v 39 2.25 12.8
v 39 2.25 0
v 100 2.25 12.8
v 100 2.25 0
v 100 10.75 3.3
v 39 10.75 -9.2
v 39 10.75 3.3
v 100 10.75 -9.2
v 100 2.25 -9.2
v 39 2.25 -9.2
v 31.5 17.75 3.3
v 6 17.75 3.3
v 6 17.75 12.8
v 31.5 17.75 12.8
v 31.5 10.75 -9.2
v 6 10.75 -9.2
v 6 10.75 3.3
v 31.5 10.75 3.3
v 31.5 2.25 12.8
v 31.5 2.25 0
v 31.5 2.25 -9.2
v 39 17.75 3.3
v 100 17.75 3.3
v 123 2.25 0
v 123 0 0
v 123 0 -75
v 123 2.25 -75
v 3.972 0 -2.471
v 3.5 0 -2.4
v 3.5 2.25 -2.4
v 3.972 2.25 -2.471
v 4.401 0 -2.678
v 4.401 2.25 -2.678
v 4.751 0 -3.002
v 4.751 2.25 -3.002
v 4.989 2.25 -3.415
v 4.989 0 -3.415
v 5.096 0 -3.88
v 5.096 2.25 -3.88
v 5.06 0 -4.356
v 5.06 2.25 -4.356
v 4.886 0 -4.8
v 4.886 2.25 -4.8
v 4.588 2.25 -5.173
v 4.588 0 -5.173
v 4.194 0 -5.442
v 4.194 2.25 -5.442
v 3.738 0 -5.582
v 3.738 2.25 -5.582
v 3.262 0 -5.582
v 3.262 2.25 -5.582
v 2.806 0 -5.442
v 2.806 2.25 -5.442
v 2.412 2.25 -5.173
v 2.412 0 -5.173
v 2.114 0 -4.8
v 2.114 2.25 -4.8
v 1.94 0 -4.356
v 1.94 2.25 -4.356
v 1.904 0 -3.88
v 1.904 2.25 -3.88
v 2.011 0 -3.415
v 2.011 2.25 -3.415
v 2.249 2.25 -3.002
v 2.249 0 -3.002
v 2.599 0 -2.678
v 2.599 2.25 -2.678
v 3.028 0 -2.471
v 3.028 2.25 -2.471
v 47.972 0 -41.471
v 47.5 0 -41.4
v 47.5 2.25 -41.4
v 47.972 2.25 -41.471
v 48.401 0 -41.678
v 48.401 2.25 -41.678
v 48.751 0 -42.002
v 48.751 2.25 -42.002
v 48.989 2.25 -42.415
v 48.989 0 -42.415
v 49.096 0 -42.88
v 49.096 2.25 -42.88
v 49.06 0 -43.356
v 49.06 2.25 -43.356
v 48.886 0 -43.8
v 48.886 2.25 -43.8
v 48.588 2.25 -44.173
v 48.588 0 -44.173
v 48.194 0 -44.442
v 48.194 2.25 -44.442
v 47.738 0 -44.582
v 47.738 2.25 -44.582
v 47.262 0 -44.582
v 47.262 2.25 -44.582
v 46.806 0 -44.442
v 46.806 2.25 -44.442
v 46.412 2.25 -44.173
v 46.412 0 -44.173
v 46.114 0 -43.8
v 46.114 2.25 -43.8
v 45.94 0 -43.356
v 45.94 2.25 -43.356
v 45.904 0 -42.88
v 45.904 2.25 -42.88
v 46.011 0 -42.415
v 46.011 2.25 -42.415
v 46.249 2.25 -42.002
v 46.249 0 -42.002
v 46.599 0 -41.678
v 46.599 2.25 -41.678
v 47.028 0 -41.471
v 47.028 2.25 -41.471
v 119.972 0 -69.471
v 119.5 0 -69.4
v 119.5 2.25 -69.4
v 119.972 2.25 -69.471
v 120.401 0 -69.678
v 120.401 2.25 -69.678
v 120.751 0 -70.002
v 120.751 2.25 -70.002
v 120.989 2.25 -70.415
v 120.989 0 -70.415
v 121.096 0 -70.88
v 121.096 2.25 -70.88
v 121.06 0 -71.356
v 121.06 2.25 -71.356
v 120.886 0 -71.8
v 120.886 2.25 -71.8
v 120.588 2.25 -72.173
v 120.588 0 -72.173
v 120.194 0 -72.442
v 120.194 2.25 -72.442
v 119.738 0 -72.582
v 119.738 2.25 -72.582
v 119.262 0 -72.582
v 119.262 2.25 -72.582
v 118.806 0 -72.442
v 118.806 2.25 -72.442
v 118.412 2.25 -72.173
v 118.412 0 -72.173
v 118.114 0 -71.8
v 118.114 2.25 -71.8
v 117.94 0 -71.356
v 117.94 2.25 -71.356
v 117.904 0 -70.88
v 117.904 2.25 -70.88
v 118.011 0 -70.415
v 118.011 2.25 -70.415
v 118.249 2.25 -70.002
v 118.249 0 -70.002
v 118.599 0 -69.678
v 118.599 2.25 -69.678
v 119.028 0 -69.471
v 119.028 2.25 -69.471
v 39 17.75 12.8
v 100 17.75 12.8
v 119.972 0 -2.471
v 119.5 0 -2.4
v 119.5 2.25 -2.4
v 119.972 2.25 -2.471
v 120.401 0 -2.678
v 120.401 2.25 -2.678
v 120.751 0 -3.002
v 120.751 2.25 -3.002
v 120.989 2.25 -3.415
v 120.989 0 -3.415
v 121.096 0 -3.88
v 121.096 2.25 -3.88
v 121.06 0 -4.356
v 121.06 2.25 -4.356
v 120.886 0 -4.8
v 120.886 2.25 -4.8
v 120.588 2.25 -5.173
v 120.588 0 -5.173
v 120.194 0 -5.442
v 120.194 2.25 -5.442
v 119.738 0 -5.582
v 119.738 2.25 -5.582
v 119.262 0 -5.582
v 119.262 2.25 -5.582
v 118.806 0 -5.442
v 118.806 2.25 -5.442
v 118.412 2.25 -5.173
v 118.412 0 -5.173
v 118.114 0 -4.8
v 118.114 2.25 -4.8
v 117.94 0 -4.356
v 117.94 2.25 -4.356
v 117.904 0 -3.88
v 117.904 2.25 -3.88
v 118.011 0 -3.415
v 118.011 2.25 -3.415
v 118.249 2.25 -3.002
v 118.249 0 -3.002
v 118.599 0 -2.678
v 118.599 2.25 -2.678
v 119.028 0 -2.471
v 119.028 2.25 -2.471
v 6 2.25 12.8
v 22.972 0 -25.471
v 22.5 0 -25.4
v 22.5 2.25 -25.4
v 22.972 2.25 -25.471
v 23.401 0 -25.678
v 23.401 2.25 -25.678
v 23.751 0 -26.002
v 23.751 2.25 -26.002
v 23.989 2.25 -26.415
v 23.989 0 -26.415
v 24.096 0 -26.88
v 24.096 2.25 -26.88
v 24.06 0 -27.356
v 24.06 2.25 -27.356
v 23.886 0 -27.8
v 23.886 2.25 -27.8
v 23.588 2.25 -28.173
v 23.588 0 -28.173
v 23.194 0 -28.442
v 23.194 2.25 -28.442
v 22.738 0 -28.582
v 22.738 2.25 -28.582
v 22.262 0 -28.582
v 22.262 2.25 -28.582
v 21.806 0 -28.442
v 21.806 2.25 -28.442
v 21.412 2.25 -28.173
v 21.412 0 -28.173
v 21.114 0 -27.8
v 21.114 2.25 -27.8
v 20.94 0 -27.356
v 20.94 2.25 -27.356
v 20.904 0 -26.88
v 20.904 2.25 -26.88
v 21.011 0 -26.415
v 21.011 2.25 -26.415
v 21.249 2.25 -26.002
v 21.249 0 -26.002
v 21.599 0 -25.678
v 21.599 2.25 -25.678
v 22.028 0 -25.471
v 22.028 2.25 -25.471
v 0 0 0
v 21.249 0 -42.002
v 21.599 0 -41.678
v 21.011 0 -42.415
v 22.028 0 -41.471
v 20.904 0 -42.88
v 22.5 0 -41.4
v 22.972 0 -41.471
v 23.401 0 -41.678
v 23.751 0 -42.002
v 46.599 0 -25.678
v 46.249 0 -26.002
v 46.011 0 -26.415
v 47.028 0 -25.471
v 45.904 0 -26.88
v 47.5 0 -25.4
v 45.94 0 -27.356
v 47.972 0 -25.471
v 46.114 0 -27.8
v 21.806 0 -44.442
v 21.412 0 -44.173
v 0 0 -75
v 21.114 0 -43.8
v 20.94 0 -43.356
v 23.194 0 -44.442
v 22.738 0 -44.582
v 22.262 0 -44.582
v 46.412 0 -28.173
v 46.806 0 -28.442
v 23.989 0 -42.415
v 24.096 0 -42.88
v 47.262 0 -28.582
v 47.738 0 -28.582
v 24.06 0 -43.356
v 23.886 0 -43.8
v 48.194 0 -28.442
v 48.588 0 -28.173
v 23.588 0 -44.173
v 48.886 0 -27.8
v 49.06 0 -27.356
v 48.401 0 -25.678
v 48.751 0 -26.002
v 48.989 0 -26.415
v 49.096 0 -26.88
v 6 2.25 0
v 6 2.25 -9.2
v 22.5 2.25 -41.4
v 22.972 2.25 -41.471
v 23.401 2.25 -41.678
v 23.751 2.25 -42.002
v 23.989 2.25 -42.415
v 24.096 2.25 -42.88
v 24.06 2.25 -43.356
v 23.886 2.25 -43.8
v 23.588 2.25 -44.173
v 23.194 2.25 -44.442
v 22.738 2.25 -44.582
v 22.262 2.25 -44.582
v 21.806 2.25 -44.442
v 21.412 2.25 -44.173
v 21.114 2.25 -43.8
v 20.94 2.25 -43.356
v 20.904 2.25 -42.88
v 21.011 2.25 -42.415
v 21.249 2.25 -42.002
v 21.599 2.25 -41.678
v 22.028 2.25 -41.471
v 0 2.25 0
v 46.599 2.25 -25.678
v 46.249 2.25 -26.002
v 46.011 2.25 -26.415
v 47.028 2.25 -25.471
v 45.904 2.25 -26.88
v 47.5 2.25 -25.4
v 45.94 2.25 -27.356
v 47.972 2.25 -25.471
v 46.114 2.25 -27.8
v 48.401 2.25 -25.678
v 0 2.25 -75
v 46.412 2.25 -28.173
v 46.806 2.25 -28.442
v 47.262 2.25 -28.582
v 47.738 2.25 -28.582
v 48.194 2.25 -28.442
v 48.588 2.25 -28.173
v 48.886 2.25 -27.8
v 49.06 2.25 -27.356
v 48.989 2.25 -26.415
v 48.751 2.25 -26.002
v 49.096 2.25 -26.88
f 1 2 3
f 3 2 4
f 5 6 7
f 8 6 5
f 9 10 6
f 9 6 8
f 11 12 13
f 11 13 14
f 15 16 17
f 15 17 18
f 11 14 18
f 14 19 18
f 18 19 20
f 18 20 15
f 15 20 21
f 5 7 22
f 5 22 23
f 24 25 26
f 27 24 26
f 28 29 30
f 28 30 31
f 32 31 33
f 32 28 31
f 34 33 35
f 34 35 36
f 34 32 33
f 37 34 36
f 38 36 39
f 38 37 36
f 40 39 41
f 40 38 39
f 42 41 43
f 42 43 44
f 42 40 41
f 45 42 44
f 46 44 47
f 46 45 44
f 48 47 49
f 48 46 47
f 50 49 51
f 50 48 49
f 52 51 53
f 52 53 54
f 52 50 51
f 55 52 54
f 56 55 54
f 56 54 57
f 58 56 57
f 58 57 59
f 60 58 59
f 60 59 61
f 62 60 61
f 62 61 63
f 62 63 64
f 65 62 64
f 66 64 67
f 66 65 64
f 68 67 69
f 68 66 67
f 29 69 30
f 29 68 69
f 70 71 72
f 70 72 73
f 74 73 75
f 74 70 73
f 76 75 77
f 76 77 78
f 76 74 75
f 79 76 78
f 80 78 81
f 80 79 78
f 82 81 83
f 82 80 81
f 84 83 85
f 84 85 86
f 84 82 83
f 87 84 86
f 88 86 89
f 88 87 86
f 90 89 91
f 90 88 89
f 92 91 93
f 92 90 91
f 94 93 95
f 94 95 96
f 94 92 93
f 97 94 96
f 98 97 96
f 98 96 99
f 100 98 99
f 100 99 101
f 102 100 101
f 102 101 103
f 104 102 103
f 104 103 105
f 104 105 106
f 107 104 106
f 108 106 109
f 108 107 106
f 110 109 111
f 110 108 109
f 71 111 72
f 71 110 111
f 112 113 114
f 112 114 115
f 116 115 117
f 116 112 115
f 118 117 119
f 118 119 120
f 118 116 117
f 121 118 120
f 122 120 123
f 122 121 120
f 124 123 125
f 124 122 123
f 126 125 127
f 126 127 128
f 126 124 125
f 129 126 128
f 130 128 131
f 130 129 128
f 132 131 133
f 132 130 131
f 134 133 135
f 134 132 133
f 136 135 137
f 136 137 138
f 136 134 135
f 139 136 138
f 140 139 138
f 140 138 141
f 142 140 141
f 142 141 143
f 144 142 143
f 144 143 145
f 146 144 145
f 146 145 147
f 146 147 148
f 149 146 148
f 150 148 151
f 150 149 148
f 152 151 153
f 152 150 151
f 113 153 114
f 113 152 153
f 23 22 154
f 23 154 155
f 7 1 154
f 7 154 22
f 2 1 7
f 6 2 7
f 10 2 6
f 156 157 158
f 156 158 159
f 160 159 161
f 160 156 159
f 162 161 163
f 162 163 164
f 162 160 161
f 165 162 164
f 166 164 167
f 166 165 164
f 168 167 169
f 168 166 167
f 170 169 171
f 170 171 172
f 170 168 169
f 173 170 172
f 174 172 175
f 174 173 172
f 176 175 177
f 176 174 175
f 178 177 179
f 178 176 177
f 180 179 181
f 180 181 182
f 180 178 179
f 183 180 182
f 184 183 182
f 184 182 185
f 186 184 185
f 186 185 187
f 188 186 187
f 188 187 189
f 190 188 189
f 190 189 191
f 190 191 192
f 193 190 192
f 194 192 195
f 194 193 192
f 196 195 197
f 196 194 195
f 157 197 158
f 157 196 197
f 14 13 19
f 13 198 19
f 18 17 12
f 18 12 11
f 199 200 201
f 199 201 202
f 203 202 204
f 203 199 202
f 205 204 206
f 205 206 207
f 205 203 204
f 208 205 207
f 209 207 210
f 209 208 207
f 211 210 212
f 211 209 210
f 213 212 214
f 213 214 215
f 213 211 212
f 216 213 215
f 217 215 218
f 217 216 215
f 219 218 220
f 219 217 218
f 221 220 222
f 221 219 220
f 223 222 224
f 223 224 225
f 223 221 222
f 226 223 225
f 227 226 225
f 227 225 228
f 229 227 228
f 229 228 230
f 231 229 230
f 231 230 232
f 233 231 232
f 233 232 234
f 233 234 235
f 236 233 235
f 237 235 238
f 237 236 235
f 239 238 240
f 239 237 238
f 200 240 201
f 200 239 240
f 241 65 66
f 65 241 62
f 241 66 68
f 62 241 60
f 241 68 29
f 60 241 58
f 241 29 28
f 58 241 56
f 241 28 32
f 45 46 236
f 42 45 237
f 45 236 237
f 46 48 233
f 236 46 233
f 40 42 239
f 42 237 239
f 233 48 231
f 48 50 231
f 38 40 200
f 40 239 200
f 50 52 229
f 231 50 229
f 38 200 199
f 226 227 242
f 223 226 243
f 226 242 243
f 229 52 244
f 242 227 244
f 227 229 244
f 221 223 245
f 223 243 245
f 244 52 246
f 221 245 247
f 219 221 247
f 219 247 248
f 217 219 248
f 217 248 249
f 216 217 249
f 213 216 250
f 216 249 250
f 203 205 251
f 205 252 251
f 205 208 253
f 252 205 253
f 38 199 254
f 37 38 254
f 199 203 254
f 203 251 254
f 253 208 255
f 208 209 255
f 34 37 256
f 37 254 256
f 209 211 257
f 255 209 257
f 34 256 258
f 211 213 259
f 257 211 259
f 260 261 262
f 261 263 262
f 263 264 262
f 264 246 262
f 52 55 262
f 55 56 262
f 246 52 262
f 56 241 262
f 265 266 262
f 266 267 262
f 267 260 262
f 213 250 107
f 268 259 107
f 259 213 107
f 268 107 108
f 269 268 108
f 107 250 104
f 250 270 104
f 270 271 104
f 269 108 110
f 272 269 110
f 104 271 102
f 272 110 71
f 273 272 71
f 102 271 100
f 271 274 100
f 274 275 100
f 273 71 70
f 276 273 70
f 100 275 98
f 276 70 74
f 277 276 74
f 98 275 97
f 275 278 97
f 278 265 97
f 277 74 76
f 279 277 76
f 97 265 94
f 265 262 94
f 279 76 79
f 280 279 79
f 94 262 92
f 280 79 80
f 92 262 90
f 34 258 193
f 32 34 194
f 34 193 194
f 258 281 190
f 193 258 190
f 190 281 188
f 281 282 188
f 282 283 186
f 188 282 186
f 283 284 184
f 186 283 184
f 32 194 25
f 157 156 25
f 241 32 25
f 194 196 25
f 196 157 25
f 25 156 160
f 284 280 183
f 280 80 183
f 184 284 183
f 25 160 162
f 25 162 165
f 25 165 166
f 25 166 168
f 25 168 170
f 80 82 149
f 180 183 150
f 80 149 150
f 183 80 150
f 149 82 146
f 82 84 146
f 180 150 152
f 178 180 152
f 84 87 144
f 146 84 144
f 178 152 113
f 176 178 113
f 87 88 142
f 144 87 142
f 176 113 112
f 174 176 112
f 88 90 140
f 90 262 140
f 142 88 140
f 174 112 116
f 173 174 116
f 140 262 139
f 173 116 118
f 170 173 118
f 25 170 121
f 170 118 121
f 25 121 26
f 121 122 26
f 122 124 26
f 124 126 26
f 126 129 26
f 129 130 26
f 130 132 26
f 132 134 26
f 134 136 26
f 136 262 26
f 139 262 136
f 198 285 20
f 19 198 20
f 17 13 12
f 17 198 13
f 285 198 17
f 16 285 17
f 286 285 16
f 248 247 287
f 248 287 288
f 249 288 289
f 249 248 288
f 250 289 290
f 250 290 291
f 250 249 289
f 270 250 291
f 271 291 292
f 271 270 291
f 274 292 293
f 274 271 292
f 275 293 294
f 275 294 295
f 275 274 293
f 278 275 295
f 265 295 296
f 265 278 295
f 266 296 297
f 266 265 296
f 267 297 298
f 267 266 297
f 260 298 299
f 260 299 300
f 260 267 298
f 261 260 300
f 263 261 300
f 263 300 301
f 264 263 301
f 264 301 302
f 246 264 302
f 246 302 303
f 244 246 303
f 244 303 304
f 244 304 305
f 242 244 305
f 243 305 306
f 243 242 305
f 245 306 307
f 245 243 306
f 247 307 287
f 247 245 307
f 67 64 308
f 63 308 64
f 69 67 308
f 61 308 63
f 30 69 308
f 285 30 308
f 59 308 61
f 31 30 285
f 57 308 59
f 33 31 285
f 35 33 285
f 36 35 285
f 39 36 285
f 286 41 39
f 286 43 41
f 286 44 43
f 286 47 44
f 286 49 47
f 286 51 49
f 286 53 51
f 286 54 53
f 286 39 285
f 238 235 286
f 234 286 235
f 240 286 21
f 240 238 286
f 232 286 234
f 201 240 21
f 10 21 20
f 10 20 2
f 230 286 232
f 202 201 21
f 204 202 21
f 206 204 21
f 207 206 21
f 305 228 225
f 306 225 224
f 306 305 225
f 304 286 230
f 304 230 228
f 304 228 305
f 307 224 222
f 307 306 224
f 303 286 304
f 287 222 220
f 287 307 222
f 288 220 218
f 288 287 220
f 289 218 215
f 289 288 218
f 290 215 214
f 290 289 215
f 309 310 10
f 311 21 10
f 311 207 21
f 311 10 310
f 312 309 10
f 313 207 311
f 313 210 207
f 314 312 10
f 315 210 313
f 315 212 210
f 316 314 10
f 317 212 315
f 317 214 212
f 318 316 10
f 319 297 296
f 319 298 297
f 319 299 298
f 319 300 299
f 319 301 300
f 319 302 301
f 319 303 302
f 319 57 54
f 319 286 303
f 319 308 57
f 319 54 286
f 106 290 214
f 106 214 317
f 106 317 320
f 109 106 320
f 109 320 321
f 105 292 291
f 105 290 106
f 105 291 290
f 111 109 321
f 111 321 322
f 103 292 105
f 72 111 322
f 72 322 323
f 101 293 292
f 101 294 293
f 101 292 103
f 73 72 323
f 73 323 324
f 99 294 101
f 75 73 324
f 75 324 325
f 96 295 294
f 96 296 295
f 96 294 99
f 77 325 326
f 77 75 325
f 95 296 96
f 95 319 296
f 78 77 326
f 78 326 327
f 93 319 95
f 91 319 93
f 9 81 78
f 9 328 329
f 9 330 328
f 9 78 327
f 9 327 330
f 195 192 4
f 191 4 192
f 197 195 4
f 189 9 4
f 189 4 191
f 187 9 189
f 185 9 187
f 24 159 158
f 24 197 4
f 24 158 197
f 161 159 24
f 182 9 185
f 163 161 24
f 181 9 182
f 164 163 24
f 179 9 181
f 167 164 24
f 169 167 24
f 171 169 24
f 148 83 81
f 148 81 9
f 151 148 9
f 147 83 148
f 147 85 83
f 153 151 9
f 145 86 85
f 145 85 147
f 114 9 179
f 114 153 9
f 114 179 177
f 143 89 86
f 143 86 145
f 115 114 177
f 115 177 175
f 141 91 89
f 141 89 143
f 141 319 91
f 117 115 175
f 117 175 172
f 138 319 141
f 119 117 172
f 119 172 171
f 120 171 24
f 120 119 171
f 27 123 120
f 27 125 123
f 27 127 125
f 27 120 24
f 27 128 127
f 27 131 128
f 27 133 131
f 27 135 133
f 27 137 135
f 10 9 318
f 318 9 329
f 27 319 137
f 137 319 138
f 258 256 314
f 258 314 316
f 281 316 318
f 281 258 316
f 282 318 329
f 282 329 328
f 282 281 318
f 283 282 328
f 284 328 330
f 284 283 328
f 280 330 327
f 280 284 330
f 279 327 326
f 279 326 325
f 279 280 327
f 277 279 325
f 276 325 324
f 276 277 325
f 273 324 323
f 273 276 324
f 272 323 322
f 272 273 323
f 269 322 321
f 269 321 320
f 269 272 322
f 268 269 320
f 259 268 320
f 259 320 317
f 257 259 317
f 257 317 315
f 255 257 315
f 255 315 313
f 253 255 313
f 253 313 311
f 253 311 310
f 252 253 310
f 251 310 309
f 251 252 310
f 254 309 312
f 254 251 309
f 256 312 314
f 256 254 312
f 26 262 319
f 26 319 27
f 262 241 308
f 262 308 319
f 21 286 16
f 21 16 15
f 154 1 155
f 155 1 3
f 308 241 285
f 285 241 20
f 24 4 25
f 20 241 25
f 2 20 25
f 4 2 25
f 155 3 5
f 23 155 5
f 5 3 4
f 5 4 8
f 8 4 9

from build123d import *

# Parameters (mm, degrees)
SKETCH1_W           = 123
SKETCH1_H           = 75
SKETCH1_R           = 1.6
BOSS_EXTRUDE1_DEPTH = 2.25
SKETCH2_W           = 25.5
SKETCH2_H           = 22
SKETCH2_W_2         = 61
BOSS_EXTRUDE2_DEPTH = 8.5
SKETCH3_W           = 25.5
SKETCH3_H           = 9.5
SKETCH3_W_2         = 61
BOSS_EXTRUDE3_DEPTH = 7


with BuildPart() as part:
    # Sketch1 → Boss-Extrude1 (new body)
    with BuildSketch(Plane(origin=(0, 0, 0), x_dir=(1, 0, 0), z_dir=(0, 1, 0))):
        with Locations((61.5, 37.5)):
            Rectangle(SKETCH1_W, SKETCH1_H)
        with Locations(Location((119.5, 71, 0), (0, 0, 270))):
            Circle(SKETCH1_R, mode=Mode.SUBTRACT)
        with Locations(Location((119.5, 4, 0), (0, 0, 270))):
            Circle(SKETCH1_R, mode=Mode.SUBTRACT)
        with Locations(Location((3.5, 4, 0), (0, 0, 270))):
            Circle(SKETCH1_R, mode=Mode.SUBTRACT)
        with Locations(Location((22.5, 43, 0), (0, 0, 270))):
            Circle(SKETCH1_R, mode=Mode.SUBTRACT)
        with Locations(Location((47.5, 43, 0), (0, 0, 270))):
            Circle(SKETCH1_R, mode=Mode.SUBTRACT)
        with Locations(Location((22.5, 27, 0), (0, 0, 270))):
            Circle(SKETCH1_R, mode=Mode.SUBTRACT)
        with Locations(Location((47.5, 27, 0), (0, 0, 270))):
            Circle(SKETCH1_R, mode=Mode.SUBTRACT)
    extrude(amount=BOSS_EXTRUDE1_DEPTH)

    # Sketch2 → Boss-Extrude2 (add)
    with BuildSketch(Plane(origin=(0, 2.25, 0), x_dir=(1, 0, 0), z_dir=(0, 1, 0))):
        with Locations((18.75, -1.8)):
            Rectangle(SKETCH2_W, SKETCH2_H)
        with Locations((69.5, -1.8)):
            Rectangle(SKETCH2_W_2, SKETCH2_H)
    extrude(amount=BOSS_EXTRUDE2_DEPTH)

    # Sketch3 → Boss-Extrude3 (add)
    with BuildSketch(Plane(origin=(0, 10.75, 0), x_dir=(1, 0, 0), z_dir=(0, 1, 0))):
        with Locations((18.75, -8.05)):
            Rectangle(SKETCH3_W, SKETCH3_H)
        with Locations((69.5, -8.05)):
            Rectangle(SKETCH3_W_2, SKETCH3_H)
    extrude(amount=BOSS_EXTRUDE3_DEPTH)


solid = part.part
